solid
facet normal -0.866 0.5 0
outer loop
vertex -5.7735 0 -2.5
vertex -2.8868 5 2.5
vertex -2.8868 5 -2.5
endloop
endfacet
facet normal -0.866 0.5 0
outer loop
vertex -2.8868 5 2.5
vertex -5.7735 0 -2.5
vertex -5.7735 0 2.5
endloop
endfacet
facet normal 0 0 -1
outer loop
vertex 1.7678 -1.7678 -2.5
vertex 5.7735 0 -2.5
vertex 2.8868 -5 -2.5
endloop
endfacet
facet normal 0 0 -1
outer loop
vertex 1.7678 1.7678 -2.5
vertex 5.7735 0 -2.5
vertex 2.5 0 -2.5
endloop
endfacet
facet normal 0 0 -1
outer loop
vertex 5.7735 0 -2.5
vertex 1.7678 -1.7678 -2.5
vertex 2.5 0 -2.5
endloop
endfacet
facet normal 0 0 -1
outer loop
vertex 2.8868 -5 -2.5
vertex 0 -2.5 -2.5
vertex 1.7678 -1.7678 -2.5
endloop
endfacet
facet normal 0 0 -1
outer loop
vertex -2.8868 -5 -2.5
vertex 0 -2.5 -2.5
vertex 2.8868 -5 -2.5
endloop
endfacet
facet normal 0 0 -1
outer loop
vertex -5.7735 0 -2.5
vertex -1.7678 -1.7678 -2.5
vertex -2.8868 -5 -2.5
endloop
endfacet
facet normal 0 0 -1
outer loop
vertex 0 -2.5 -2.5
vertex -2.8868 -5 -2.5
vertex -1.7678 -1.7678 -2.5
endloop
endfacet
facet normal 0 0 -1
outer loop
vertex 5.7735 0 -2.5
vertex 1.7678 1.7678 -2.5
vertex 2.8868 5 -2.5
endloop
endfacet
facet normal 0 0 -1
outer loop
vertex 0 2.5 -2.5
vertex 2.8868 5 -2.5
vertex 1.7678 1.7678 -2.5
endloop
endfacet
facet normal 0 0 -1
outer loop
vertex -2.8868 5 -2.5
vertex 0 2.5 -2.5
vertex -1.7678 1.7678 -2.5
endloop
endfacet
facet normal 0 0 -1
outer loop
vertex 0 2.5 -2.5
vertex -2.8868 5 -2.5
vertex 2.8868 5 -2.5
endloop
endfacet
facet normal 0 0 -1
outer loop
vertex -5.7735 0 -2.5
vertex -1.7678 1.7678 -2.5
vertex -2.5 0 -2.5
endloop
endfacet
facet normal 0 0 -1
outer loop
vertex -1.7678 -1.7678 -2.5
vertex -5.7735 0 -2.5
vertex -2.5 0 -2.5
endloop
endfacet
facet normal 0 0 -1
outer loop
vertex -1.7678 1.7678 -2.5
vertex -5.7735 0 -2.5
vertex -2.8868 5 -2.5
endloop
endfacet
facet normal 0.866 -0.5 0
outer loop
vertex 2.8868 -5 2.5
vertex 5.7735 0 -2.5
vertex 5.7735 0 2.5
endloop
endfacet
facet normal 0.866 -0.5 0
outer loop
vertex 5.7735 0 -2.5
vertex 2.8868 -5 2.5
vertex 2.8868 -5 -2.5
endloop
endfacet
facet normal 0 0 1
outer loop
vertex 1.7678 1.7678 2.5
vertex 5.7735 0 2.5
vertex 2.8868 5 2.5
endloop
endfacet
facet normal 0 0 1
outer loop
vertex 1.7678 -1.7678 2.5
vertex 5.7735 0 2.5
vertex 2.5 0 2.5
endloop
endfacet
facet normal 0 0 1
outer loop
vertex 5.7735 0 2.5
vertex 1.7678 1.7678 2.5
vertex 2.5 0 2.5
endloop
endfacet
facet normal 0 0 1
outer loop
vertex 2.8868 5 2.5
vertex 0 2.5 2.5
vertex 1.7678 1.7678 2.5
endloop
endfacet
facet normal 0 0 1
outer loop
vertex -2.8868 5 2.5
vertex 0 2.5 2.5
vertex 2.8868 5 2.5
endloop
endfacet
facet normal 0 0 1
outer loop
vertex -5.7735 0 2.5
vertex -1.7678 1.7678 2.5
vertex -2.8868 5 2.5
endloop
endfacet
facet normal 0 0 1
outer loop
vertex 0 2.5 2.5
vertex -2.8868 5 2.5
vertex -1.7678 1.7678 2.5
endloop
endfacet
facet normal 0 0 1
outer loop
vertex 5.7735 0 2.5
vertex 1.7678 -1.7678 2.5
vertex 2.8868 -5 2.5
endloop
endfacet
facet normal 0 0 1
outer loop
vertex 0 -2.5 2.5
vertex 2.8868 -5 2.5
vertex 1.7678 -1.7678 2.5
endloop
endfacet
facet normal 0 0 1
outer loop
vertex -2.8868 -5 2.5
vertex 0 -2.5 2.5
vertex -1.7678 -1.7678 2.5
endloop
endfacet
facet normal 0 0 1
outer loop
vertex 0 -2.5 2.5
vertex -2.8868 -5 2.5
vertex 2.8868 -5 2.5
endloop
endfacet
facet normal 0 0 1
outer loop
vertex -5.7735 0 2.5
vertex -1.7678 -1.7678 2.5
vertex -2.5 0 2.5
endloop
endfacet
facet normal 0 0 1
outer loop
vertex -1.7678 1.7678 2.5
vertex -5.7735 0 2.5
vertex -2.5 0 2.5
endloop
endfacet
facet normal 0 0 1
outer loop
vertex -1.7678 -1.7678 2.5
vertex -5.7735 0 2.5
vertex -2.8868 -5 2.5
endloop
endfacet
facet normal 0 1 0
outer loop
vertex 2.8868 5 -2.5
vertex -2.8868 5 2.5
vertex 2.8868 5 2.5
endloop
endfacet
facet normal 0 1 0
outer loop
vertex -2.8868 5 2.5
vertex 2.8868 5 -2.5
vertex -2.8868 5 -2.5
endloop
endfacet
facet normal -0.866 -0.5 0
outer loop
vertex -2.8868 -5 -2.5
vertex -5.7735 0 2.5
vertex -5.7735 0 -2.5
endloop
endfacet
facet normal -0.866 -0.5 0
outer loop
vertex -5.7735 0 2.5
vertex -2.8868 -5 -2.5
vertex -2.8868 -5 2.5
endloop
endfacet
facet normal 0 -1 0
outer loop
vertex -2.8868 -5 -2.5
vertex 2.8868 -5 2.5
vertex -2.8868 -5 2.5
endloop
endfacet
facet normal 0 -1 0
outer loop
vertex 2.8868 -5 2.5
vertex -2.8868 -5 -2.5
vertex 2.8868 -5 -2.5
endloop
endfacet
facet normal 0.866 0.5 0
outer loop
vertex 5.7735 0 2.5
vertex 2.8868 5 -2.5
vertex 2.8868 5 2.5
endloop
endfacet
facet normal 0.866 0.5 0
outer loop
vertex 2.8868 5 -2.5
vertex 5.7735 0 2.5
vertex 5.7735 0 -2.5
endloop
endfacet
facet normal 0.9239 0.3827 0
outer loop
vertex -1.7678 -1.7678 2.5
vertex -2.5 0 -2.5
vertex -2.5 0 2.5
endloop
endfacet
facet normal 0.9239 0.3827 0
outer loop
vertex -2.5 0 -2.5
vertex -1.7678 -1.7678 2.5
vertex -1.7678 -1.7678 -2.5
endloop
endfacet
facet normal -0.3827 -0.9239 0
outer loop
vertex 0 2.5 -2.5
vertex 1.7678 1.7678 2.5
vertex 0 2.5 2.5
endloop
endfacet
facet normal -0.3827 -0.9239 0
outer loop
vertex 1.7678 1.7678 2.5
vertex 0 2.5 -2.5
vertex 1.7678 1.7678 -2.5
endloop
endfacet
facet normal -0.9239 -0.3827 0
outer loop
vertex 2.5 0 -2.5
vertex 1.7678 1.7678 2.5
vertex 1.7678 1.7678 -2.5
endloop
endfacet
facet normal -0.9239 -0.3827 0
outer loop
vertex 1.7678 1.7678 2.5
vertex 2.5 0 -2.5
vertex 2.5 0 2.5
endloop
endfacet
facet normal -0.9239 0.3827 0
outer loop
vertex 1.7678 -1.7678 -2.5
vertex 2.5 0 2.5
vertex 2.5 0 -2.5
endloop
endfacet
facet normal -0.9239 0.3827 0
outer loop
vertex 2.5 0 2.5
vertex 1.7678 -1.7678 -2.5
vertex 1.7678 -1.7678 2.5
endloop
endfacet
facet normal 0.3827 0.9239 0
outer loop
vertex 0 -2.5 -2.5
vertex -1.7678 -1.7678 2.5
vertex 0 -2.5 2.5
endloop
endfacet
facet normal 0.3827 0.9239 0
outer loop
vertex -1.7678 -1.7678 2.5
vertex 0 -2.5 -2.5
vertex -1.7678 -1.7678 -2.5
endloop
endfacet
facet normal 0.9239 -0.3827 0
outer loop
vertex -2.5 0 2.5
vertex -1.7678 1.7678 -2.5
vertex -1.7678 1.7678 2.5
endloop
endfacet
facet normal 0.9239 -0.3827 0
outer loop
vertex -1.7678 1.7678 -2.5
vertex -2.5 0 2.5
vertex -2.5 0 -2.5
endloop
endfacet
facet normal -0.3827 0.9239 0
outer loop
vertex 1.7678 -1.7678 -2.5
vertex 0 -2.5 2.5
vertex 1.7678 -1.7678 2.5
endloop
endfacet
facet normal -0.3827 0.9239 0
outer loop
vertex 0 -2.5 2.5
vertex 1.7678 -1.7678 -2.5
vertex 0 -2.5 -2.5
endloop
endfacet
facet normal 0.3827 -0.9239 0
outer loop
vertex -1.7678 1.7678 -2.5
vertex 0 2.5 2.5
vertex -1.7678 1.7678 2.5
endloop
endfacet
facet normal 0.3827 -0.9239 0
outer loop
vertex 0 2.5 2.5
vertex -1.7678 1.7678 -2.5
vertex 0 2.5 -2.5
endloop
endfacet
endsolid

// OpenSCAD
// Simple Hex Nut Model
// Author: AI Assistant
// Date: 2023-10-27

// --- Parameters ---

// Width of the hexagon measured between two parallel flat sides
hex_flat_to_flat_width = 10; // [mm]

// Diameter of the central hole
hole_diameter = 5; // [mm]

// Thickness of the nut (height of the extrusion)
nut_thickness = 5; // [mm]

// --- Calculations ---

// Calculate the radius of the hexagon's circumscribed circle (distance from center to vertex)
// R = (W/2) / cos(30), where W is the flat-to-flat width
hex_radius = (hex_flat_to_flat_width / 2) / cos(30);

// Define a small value to ensure the hole cuts completely through
epsilon = 0.1; // [mm]

// --- Model Definition ---

// Use difference() to subtract the hole from the hexagonal prism
difference() {
    // 1. Create the outer hexagonal prism
    linear_extrude(height = nut_thickness, center = true) {
        // Create a 2D hexagon centered at the origin
        // Use circle() with $fn=6 for a regular hexagon
        // The radius 'r' corresponds to the distance from the center to a vertex
        circle(r = hex_radius, $fn = 6);
    }

    // 2. Create the central cylindrical hole
    // Make the cylinder slightly taller than the nut thickness to ensure a clean cut
    cylinder(d = hole_diameter, h = nut_thickness + 2 * epsilon, center = true);
}

// End of script
